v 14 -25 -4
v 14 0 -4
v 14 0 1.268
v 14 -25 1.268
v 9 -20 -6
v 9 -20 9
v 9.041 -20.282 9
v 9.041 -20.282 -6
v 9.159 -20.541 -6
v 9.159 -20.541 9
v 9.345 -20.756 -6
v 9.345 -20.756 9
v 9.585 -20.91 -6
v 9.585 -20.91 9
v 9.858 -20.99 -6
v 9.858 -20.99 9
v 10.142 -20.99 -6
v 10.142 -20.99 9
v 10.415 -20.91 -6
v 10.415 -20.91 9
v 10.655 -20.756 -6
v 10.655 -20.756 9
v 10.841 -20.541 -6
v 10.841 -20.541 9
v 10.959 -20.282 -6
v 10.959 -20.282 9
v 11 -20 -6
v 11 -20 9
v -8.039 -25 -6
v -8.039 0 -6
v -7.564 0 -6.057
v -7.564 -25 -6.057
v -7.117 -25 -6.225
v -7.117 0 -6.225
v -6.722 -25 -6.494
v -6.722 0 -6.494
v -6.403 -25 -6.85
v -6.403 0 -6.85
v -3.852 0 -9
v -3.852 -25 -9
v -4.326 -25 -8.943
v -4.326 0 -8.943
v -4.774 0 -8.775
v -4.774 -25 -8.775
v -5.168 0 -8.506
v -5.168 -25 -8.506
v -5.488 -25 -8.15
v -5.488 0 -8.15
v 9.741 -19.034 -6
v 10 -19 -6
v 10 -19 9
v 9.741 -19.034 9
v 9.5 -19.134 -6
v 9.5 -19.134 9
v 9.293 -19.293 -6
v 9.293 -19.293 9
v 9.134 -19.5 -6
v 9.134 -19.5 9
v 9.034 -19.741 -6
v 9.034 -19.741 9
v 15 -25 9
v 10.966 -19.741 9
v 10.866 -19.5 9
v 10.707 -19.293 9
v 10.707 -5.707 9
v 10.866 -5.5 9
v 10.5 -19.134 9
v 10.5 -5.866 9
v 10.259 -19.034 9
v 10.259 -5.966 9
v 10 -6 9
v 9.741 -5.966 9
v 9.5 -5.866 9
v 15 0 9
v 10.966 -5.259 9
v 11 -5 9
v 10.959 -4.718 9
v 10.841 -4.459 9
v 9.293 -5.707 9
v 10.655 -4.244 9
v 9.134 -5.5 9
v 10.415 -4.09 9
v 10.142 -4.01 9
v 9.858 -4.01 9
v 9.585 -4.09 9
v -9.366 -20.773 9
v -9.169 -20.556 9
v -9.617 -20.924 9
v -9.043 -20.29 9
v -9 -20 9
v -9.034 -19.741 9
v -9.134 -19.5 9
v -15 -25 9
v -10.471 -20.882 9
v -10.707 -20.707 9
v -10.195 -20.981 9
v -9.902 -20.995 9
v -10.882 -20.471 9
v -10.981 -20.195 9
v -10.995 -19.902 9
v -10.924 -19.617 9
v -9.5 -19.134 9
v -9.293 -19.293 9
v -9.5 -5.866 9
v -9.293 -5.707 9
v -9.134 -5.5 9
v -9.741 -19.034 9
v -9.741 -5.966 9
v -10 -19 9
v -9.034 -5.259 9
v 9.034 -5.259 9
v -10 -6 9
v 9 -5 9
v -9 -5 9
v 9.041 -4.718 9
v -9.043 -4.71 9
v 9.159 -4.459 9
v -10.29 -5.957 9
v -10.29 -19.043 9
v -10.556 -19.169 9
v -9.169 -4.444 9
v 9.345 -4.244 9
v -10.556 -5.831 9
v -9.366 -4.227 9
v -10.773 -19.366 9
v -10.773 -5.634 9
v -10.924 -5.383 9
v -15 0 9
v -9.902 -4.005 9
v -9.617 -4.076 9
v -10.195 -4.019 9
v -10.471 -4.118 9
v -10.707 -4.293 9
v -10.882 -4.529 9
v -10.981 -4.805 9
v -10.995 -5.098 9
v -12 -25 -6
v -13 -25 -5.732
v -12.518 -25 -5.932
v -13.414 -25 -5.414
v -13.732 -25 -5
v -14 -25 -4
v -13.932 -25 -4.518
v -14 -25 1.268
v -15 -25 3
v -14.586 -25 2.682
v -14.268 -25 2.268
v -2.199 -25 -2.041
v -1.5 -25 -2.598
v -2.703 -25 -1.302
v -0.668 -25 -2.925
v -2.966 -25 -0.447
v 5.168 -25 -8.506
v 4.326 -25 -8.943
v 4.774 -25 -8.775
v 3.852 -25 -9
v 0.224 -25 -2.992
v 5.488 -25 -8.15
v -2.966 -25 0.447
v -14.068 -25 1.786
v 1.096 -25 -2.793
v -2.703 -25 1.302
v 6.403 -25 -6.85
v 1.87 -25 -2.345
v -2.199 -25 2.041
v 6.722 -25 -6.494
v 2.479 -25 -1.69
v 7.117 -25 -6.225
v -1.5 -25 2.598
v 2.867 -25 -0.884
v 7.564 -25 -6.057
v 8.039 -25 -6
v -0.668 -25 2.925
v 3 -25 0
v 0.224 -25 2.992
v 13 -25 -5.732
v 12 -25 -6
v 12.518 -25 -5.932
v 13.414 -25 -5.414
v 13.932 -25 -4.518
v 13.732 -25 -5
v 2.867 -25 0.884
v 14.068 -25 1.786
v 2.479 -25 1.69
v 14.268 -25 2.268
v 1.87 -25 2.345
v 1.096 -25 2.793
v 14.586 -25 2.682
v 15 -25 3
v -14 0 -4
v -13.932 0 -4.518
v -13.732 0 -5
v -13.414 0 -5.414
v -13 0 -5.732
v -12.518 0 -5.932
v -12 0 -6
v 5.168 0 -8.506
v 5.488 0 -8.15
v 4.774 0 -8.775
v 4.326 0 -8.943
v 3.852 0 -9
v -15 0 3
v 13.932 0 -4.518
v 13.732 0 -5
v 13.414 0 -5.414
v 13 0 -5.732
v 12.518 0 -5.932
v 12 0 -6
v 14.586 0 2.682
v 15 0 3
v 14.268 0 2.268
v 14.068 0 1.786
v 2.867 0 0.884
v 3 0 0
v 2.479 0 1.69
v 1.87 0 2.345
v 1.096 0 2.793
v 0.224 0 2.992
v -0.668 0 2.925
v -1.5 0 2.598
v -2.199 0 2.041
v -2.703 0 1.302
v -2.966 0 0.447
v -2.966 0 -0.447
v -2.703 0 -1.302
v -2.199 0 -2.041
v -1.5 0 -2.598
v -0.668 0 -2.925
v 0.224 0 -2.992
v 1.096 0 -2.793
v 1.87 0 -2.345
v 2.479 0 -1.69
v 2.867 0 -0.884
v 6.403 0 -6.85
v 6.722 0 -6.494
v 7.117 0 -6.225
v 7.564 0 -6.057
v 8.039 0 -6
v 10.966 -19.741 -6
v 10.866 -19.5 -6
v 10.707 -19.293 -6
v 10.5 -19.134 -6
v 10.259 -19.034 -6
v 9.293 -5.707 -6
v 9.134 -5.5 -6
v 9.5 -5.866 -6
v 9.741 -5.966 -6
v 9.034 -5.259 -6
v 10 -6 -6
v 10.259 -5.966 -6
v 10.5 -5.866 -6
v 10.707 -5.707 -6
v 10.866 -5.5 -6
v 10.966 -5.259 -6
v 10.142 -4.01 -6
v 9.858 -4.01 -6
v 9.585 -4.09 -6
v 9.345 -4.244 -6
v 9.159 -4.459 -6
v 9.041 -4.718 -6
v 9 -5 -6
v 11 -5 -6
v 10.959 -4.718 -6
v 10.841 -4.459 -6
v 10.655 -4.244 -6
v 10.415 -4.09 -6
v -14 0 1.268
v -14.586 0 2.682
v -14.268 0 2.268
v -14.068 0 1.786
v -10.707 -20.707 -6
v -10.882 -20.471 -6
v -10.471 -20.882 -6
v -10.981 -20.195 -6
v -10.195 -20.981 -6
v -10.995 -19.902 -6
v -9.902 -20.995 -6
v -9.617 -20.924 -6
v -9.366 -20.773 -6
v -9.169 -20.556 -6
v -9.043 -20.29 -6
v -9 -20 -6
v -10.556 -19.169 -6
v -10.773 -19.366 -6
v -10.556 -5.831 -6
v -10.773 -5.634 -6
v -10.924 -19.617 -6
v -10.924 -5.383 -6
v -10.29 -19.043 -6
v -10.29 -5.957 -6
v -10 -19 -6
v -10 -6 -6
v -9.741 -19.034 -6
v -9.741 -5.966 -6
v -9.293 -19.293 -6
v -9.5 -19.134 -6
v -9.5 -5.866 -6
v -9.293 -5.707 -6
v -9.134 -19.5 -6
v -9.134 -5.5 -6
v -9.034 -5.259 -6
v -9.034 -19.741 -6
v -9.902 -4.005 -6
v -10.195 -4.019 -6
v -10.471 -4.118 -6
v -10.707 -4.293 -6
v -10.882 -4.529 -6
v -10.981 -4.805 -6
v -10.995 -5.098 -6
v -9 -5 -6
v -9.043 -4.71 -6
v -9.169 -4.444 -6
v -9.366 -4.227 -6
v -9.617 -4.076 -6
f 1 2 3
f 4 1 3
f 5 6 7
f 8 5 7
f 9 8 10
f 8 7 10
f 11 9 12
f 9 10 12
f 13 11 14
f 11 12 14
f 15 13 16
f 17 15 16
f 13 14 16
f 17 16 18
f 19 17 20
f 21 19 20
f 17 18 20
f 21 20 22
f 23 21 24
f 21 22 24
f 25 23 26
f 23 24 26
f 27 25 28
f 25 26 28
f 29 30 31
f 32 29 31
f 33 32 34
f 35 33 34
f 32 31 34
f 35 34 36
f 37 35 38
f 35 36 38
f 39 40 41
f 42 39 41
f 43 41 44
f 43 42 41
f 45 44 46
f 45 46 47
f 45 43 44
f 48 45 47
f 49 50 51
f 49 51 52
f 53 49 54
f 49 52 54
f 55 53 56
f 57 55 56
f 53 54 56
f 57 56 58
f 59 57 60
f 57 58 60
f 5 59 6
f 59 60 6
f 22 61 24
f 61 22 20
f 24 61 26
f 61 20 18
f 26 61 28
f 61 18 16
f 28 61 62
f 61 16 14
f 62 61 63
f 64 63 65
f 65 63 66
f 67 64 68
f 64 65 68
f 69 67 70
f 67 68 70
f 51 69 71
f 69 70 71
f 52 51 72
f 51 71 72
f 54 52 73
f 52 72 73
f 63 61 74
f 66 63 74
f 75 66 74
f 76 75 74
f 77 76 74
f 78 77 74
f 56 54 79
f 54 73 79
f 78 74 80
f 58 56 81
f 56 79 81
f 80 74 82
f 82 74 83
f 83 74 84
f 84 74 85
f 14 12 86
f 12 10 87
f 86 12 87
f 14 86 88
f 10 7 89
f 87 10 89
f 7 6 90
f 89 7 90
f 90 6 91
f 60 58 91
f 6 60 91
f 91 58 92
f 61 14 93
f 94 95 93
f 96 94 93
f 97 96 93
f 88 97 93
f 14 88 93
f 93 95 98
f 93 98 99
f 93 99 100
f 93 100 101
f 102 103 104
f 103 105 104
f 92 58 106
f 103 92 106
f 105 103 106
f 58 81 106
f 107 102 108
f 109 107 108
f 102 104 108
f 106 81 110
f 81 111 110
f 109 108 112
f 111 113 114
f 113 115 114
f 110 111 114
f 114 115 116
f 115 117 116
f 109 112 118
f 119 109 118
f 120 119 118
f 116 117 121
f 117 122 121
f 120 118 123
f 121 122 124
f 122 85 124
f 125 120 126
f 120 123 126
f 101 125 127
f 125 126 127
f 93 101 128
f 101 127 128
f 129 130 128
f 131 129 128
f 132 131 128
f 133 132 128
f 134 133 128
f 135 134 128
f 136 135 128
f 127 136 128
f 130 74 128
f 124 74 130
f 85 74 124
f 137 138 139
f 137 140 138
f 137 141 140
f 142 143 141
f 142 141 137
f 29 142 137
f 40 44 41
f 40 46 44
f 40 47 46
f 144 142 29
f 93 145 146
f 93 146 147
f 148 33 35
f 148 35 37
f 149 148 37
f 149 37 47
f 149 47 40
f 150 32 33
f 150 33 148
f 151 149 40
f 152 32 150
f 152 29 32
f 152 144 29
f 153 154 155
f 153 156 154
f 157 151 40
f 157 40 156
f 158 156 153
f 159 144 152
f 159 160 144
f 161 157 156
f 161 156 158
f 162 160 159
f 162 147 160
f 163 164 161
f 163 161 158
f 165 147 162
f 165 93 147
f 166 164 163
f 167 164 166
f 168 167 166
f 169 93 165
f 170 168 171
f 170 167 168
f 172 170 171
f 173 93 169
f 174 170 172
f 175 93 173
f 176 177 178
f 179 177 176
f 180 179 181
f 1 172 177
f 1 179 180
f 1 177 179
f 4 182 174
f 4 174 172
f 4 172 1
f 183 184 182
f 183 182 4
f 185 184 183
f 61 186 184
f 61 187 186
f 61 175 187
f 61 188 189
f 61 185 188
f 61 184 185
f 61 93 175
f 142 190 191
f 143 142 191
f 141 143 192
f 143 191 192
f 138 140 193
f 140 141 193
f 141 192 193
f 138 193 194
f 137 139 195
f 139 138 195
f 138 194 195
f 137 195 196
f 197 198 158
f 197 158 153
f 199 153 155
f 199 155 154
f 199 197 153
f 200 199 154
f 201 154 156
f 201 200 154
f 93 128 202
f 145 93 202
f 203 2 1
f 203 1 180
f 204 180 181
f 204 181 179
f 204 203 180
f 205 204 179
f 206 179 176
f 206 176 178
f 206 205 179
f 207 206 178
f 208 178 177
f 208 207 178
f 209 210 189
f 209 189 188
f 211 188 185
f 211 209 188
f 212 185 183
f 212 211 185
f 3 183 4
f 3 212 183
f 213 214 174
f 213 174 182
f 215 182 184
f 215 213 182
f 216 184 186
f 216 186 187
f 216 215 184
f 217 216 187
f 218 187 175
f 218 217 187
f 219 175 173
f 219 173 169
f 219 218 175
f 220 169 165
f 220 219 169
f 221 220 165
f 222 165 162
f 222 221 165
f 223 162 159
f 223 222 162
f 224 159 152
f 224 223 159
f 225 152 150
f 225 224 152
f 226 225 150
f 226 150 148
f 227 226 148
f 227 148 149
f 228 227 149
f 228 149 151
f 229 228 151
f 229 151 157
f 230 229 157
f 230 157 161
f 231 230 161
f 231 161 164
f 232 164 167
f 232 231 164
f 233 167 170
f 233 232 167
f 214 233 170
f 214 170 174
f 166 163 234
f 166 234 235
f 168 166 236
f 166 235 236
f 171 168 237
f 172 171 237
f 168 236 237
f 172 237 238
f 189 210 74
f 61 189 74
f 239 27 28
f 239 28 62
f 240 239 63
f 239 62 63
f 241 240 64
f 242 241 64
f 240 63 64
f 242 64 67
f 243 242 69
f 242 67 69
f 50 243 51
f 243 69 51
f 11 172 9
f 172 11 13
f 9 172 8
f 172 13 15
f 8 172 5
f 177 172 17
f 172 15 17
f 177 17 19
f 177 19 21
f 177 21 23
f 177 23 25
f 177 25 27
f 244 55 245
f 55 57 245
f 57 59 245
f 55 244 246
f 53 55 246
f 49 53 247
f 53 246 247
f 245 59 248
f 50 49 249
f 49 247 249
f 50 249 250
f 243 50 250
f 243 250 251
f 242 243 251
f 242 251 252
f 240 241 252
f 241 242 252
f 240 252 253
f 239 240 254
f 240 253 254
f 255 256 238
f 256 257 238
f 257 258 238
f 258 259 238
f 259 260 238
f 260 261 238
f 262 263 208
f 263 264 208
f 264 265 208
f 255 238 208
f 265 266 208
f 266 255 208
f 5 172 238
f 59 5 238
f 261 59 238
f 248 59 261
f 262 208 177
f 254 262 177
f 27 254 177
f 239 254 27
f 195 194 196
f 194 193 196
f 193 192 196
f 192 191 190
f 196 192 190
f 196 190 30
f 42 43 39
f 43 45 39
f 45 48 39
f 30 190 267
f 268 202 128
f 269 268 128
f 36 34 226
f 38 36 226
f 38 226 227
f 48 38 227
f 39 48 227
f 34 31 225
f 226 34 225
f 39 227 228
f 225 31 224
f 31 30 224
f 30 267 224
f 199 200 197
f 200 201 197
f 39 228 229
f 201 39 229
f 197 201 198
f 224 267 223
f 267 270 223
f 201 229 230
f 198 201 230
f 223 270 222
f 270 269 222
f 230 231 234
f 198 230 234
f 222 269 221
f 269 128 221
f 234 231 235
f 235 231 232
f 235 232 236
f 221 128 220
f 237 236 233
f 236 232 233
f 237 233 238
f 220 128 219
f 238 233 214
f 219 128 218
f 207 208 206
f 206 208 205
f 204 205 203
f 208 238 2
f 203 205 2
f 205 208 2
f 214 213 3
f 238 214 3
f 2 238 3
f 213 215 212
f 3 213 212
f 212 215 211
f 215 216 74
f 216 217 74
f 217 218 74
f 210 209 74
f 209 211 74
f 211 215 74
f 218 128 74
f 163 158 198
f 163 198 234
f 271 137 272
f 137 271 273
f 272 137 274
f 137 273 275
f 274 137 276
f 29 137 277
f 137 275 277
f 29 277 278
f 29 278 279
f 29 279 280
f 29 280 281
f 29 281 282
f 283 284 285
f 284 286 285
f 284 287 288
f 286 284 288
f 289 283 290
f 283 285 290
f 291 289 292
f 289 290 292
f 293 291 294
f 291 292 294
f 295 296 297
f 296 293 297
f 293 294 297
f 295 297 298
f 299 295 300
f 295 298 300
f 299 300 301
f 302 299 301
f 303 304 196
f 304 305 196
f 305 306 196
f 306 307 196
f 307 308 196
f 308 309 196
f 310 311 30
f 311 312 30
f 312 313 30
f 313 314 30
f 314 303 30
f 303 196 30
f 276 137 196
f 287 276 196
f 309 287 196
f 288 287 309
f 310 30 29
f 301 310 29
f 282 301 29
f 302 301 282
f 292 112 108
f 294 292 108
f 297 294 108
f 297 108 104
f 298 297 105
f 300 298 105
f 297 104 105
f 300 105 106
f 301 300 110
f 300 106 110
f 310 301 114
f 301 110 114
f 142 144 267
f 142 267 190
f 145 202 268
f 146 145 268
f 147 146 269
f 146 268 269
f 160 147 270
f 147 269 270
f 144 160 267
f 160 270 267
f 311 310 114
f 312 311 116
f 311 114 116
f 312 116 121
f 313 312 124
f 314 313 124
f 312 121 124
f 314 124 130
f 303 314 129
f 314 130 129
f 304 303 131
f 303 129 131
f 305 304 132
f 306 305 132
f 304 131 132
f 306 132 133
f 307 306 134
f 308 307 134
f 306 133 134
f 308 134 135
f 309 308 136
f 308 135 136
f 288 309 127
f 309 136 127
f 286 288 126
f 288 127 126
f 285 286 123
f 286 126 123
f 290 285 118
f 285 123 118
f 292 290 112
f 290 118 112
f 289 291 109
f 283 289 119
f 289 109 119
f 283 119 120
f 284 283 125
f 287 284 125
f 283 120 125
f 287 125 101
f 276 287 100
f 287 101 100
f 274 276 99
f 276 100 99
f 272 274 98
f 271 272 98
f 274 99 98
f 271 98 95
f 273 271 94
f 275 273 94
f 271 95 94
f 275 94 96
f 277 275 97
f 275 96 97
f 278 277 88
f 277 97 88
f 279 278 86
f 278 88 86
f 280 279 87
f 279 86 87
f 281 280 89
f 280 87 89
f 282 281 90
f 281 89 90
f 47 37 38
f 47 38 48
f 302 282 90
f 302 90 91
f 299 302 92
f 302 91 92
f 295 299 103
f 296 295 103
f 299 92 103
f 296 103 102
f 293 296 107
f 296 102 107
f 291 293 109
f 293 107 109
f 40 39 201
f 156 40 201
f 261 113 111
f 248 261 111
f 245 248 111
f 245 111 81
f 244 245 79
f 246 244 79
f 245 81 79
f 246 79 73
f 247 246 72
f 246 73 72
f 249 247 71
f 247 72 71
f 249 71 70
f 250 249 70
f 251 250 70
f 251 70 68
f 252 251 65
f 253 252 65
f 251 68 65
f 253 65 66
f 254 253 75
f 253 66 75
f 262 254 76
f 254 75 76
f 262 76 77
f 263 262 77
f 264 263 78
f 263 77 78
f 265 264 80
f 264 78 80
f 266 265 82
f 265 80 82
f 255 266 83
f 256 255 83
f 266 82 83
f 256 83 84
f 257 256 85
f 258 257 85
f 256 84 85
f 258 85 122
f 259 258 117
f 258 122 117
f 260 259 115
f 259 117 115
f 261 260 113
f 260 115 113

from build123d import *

# Parameters (mm, degrees)
F0_R         = 3
F1_DEPTH     = 25
F3_DEPTH     = 18.001
F4_T1_DEPTH  = 25
F4_T3_DEPTH  = 25
F4_T5_DEPTH  = 25
F4_T7_DEPTH  = 25
F4_T9_DEPTH  = 35
F4_T11_DEPTH = 30.1931758285
F4_T13_DEPTH = 30.1931758285
F4_T15_DEPTH = 35


# Not quite as in the source:
# - a fillet or chamfer that OpenCascade refuses, or shapes differently, is made with other operations: its cross-section is extruded or revolved along the edge and cut away or added


with BuildPart() as f1:
    # F0 (on Front) → F1 (new body)
    with BuildSketch(Plane.XZ):
        Polygon((15, 9), (-15, 9), (-15, 3), (-14, 3), (-14, -6), (-7, -6), (-4.890570417, -9), (4.890570417, -9), (7, -6), (14, -6), (14, 3), (15, 3), align=None)
        Circle(F0_R, mode=Mode.SUBTRACT)
    extrude(amount=F1_DEPTH)

    # F2 (on face) → F3 (cut, through all)
    with BuildSketch(Plane.XY.offset(9)):
        with BuildLine():
            Line((10, -5), (10, -6))
            ThreePointArc((10, -6), (10.7071067812, -5.7071067812), (11, -5))
            ThreePointArc((11, -5), (10, -4), (9, -5))
            Line((9, -5), (10, -5))
        make_face()
        with BuildLine():
            ThreePointArc((9, -5), (9.2928932188, -5.7071067812), (10, -6))
            Line((10, -6), (10, -5))
            Line((10, -5), (9, -5))
        make_face()
        with BuildLine():
            Line((10, -20), (9, -20))
            ThreePointArc((9, -20), (10, -21), (11, -20))
            ThreePointArc((11, -20), (10.7071067812, -19.2928932188), (10, -19))
            Line((10, -19), (10, -20))
        make_face()
        with BuildLine():
            ThreePointArc((10, -19), (9.2928932188, -19.2928932188), (9, -20))
            Line((9, -20), (10, -20))
            Line((10, -20), (10, -19))
        make_face()
        with BuildLine():
            ThreePointArc((-10, -19), (-10.7071067812, -20.7071067812), (-9, -20))
            Line((-9, -20), (-10, -20))
            Line((-10, -20), (-10, -19))
        make_face()
        with BuildLine():
            Line((-10, -20), (-9, -20))
            ThreePointArc((-9, -20), (-9.2928932188, -19.2928932188), (-10, -19))
            Line((-10, -19), (-10, -20))
        make_face()
        with BuildLine():
            ThreePointArc((-9, -5), (-10.7071067812, -4.2928932188), (-10, -6))
            Line((-10, -6), (-10, -5))
            Line((-10, -5), (-9, -5))
        make_face()
        with BuildLine():
            Line((-10, -5), (-10, -6))
            ThreePointArc((-10, -6), (-9.2928932188, -5.7071067812), (-9, -5))
            Line((-9, -5), (-10, -5))
        make_face()
    extrude(amount=-F3_DEPTH, mode=Mode.SUBTRACT)

    # F4: fillet of radius 2 on 8 edges, made by hand

    # F4_s2 → F4_t1 (join)
    with BuildSketch(Plane.XZ):
        with BuildLine():
            ThreePointArc((15, 3), (14.2679491924, 2.2679491924), (14, 1.2679491924))
            Line((14, 1.2679491924), (14, 3))
            Line((14, 3), (15, 3))
        make_face()
    extrude(amount=F4_T1_DEPTH)

    # F4_s4 → F4_t3 (join)
    with BuildSketch(Plane.XZ):
        with BuildLine():
            ThreePointArc((-15, 3), (-14.2679491924, 2.2679491924), (-14, 1.2679491924))
            Line((-14, 1.2679491924), (-14, 3))
            Line((-14, 3), (-15, 3))
        make_face()
    extrude(amount=F4_T3_DEPTH)

    # F4_s6 → F4_t5 (join)
    with BuildSketch(Plane.XZ):
        with BuildLine():
            ThreePointArc((-8.0386351657, -6), (-7.1168832592, -6.2250708682), (-6.4025908546, -6.8496265771))
            Line((-6.4025908546, -6.8496265771), (-7, -6))
            Line((-7, -6), (-8.0386351657, -6))
        make_face()
    extrude(amount=F4_T5_DEPTH)

    # F4_s8 → F4_t7 (join)
    with BuildSketch(Plane.XZ):
        with BuildLine():
            ThreePointArc((6.4025908546, -6.8496265771), (7.1168832592, -6.2250708682), (8.0386351657, -6))
            Line((8.0386351657, -6), (7, -6))
            Line((7, -6), (6.4025908546, -6.8496265771))
        make_face()
    extrude(amount=F4_T7_DEPTH)

    # F4_s10 → F4_t9 (cut)
    with BuildSketch(Plane.XZ.offset(-5)):
        with BuildLine():
            ThreePointArc((-14, -4), (-13.4142135624, -5.4142135624), (-12, -6))
            Line((-12, -6), (-14, -6))
            Line((-14, -6), (-14, -4))
        make_face()
    extrude(amount=F4_T9_DEPTH, mode=Mode.SUBTRACT)

    # F4_s12 → F4_t11 (cut)
    with BuildSketch(Plane.XZ.offset(-2.5965879143)):
        with BuildLine():
            ThreePointArc((-3.8519352513, -9), (-4.7736871578, -8.7749291318), (-5.4879795624, -8.1503734229))
            Line((-5.4879795624, -8.1503734229), (-4.890570417, -9))
            Line((-4.890570417, -9), (-3.8519352513, -9))
        make_face()
    extrude(amount=F4_T11_DEPTH, mode=Mode.SUBTRACT)

    # F4_s14 → F4_t13 (cut)
    with BuildSketch(Plane.XZ.offset(-2.5965879143)):
        with BuildLine():
            ThreePointArc((5.4879795624, -8.1503734229), (4.7736871578, -8.7749291318), (3.8519352513, -9))
            Line((3.8519352513, -9), (4.890570417, -9))
            Line((4.890570417, -9), (5.4879795624, -8.1503734229))
        make_face()
    extrude(amount=F4_T13_DEPTH, mode=Mode.SUBTRACT)

    # F4_s16 → F4_t15 (cut)
    with BuildSketch(Plane.XZ.offset(-5)):
        with BuildLine():
            ThreePointArc((14, -4), (13.4142135624, -5.4142135624), (12, -6))
            Line((12, -6), (14, -6))
            Line((14, -6), (14, -4))
        make_face()
    extrude(amount=F4_T15_DEPTH, mode=Mode.SUBTRACT)


solid = f1.part
